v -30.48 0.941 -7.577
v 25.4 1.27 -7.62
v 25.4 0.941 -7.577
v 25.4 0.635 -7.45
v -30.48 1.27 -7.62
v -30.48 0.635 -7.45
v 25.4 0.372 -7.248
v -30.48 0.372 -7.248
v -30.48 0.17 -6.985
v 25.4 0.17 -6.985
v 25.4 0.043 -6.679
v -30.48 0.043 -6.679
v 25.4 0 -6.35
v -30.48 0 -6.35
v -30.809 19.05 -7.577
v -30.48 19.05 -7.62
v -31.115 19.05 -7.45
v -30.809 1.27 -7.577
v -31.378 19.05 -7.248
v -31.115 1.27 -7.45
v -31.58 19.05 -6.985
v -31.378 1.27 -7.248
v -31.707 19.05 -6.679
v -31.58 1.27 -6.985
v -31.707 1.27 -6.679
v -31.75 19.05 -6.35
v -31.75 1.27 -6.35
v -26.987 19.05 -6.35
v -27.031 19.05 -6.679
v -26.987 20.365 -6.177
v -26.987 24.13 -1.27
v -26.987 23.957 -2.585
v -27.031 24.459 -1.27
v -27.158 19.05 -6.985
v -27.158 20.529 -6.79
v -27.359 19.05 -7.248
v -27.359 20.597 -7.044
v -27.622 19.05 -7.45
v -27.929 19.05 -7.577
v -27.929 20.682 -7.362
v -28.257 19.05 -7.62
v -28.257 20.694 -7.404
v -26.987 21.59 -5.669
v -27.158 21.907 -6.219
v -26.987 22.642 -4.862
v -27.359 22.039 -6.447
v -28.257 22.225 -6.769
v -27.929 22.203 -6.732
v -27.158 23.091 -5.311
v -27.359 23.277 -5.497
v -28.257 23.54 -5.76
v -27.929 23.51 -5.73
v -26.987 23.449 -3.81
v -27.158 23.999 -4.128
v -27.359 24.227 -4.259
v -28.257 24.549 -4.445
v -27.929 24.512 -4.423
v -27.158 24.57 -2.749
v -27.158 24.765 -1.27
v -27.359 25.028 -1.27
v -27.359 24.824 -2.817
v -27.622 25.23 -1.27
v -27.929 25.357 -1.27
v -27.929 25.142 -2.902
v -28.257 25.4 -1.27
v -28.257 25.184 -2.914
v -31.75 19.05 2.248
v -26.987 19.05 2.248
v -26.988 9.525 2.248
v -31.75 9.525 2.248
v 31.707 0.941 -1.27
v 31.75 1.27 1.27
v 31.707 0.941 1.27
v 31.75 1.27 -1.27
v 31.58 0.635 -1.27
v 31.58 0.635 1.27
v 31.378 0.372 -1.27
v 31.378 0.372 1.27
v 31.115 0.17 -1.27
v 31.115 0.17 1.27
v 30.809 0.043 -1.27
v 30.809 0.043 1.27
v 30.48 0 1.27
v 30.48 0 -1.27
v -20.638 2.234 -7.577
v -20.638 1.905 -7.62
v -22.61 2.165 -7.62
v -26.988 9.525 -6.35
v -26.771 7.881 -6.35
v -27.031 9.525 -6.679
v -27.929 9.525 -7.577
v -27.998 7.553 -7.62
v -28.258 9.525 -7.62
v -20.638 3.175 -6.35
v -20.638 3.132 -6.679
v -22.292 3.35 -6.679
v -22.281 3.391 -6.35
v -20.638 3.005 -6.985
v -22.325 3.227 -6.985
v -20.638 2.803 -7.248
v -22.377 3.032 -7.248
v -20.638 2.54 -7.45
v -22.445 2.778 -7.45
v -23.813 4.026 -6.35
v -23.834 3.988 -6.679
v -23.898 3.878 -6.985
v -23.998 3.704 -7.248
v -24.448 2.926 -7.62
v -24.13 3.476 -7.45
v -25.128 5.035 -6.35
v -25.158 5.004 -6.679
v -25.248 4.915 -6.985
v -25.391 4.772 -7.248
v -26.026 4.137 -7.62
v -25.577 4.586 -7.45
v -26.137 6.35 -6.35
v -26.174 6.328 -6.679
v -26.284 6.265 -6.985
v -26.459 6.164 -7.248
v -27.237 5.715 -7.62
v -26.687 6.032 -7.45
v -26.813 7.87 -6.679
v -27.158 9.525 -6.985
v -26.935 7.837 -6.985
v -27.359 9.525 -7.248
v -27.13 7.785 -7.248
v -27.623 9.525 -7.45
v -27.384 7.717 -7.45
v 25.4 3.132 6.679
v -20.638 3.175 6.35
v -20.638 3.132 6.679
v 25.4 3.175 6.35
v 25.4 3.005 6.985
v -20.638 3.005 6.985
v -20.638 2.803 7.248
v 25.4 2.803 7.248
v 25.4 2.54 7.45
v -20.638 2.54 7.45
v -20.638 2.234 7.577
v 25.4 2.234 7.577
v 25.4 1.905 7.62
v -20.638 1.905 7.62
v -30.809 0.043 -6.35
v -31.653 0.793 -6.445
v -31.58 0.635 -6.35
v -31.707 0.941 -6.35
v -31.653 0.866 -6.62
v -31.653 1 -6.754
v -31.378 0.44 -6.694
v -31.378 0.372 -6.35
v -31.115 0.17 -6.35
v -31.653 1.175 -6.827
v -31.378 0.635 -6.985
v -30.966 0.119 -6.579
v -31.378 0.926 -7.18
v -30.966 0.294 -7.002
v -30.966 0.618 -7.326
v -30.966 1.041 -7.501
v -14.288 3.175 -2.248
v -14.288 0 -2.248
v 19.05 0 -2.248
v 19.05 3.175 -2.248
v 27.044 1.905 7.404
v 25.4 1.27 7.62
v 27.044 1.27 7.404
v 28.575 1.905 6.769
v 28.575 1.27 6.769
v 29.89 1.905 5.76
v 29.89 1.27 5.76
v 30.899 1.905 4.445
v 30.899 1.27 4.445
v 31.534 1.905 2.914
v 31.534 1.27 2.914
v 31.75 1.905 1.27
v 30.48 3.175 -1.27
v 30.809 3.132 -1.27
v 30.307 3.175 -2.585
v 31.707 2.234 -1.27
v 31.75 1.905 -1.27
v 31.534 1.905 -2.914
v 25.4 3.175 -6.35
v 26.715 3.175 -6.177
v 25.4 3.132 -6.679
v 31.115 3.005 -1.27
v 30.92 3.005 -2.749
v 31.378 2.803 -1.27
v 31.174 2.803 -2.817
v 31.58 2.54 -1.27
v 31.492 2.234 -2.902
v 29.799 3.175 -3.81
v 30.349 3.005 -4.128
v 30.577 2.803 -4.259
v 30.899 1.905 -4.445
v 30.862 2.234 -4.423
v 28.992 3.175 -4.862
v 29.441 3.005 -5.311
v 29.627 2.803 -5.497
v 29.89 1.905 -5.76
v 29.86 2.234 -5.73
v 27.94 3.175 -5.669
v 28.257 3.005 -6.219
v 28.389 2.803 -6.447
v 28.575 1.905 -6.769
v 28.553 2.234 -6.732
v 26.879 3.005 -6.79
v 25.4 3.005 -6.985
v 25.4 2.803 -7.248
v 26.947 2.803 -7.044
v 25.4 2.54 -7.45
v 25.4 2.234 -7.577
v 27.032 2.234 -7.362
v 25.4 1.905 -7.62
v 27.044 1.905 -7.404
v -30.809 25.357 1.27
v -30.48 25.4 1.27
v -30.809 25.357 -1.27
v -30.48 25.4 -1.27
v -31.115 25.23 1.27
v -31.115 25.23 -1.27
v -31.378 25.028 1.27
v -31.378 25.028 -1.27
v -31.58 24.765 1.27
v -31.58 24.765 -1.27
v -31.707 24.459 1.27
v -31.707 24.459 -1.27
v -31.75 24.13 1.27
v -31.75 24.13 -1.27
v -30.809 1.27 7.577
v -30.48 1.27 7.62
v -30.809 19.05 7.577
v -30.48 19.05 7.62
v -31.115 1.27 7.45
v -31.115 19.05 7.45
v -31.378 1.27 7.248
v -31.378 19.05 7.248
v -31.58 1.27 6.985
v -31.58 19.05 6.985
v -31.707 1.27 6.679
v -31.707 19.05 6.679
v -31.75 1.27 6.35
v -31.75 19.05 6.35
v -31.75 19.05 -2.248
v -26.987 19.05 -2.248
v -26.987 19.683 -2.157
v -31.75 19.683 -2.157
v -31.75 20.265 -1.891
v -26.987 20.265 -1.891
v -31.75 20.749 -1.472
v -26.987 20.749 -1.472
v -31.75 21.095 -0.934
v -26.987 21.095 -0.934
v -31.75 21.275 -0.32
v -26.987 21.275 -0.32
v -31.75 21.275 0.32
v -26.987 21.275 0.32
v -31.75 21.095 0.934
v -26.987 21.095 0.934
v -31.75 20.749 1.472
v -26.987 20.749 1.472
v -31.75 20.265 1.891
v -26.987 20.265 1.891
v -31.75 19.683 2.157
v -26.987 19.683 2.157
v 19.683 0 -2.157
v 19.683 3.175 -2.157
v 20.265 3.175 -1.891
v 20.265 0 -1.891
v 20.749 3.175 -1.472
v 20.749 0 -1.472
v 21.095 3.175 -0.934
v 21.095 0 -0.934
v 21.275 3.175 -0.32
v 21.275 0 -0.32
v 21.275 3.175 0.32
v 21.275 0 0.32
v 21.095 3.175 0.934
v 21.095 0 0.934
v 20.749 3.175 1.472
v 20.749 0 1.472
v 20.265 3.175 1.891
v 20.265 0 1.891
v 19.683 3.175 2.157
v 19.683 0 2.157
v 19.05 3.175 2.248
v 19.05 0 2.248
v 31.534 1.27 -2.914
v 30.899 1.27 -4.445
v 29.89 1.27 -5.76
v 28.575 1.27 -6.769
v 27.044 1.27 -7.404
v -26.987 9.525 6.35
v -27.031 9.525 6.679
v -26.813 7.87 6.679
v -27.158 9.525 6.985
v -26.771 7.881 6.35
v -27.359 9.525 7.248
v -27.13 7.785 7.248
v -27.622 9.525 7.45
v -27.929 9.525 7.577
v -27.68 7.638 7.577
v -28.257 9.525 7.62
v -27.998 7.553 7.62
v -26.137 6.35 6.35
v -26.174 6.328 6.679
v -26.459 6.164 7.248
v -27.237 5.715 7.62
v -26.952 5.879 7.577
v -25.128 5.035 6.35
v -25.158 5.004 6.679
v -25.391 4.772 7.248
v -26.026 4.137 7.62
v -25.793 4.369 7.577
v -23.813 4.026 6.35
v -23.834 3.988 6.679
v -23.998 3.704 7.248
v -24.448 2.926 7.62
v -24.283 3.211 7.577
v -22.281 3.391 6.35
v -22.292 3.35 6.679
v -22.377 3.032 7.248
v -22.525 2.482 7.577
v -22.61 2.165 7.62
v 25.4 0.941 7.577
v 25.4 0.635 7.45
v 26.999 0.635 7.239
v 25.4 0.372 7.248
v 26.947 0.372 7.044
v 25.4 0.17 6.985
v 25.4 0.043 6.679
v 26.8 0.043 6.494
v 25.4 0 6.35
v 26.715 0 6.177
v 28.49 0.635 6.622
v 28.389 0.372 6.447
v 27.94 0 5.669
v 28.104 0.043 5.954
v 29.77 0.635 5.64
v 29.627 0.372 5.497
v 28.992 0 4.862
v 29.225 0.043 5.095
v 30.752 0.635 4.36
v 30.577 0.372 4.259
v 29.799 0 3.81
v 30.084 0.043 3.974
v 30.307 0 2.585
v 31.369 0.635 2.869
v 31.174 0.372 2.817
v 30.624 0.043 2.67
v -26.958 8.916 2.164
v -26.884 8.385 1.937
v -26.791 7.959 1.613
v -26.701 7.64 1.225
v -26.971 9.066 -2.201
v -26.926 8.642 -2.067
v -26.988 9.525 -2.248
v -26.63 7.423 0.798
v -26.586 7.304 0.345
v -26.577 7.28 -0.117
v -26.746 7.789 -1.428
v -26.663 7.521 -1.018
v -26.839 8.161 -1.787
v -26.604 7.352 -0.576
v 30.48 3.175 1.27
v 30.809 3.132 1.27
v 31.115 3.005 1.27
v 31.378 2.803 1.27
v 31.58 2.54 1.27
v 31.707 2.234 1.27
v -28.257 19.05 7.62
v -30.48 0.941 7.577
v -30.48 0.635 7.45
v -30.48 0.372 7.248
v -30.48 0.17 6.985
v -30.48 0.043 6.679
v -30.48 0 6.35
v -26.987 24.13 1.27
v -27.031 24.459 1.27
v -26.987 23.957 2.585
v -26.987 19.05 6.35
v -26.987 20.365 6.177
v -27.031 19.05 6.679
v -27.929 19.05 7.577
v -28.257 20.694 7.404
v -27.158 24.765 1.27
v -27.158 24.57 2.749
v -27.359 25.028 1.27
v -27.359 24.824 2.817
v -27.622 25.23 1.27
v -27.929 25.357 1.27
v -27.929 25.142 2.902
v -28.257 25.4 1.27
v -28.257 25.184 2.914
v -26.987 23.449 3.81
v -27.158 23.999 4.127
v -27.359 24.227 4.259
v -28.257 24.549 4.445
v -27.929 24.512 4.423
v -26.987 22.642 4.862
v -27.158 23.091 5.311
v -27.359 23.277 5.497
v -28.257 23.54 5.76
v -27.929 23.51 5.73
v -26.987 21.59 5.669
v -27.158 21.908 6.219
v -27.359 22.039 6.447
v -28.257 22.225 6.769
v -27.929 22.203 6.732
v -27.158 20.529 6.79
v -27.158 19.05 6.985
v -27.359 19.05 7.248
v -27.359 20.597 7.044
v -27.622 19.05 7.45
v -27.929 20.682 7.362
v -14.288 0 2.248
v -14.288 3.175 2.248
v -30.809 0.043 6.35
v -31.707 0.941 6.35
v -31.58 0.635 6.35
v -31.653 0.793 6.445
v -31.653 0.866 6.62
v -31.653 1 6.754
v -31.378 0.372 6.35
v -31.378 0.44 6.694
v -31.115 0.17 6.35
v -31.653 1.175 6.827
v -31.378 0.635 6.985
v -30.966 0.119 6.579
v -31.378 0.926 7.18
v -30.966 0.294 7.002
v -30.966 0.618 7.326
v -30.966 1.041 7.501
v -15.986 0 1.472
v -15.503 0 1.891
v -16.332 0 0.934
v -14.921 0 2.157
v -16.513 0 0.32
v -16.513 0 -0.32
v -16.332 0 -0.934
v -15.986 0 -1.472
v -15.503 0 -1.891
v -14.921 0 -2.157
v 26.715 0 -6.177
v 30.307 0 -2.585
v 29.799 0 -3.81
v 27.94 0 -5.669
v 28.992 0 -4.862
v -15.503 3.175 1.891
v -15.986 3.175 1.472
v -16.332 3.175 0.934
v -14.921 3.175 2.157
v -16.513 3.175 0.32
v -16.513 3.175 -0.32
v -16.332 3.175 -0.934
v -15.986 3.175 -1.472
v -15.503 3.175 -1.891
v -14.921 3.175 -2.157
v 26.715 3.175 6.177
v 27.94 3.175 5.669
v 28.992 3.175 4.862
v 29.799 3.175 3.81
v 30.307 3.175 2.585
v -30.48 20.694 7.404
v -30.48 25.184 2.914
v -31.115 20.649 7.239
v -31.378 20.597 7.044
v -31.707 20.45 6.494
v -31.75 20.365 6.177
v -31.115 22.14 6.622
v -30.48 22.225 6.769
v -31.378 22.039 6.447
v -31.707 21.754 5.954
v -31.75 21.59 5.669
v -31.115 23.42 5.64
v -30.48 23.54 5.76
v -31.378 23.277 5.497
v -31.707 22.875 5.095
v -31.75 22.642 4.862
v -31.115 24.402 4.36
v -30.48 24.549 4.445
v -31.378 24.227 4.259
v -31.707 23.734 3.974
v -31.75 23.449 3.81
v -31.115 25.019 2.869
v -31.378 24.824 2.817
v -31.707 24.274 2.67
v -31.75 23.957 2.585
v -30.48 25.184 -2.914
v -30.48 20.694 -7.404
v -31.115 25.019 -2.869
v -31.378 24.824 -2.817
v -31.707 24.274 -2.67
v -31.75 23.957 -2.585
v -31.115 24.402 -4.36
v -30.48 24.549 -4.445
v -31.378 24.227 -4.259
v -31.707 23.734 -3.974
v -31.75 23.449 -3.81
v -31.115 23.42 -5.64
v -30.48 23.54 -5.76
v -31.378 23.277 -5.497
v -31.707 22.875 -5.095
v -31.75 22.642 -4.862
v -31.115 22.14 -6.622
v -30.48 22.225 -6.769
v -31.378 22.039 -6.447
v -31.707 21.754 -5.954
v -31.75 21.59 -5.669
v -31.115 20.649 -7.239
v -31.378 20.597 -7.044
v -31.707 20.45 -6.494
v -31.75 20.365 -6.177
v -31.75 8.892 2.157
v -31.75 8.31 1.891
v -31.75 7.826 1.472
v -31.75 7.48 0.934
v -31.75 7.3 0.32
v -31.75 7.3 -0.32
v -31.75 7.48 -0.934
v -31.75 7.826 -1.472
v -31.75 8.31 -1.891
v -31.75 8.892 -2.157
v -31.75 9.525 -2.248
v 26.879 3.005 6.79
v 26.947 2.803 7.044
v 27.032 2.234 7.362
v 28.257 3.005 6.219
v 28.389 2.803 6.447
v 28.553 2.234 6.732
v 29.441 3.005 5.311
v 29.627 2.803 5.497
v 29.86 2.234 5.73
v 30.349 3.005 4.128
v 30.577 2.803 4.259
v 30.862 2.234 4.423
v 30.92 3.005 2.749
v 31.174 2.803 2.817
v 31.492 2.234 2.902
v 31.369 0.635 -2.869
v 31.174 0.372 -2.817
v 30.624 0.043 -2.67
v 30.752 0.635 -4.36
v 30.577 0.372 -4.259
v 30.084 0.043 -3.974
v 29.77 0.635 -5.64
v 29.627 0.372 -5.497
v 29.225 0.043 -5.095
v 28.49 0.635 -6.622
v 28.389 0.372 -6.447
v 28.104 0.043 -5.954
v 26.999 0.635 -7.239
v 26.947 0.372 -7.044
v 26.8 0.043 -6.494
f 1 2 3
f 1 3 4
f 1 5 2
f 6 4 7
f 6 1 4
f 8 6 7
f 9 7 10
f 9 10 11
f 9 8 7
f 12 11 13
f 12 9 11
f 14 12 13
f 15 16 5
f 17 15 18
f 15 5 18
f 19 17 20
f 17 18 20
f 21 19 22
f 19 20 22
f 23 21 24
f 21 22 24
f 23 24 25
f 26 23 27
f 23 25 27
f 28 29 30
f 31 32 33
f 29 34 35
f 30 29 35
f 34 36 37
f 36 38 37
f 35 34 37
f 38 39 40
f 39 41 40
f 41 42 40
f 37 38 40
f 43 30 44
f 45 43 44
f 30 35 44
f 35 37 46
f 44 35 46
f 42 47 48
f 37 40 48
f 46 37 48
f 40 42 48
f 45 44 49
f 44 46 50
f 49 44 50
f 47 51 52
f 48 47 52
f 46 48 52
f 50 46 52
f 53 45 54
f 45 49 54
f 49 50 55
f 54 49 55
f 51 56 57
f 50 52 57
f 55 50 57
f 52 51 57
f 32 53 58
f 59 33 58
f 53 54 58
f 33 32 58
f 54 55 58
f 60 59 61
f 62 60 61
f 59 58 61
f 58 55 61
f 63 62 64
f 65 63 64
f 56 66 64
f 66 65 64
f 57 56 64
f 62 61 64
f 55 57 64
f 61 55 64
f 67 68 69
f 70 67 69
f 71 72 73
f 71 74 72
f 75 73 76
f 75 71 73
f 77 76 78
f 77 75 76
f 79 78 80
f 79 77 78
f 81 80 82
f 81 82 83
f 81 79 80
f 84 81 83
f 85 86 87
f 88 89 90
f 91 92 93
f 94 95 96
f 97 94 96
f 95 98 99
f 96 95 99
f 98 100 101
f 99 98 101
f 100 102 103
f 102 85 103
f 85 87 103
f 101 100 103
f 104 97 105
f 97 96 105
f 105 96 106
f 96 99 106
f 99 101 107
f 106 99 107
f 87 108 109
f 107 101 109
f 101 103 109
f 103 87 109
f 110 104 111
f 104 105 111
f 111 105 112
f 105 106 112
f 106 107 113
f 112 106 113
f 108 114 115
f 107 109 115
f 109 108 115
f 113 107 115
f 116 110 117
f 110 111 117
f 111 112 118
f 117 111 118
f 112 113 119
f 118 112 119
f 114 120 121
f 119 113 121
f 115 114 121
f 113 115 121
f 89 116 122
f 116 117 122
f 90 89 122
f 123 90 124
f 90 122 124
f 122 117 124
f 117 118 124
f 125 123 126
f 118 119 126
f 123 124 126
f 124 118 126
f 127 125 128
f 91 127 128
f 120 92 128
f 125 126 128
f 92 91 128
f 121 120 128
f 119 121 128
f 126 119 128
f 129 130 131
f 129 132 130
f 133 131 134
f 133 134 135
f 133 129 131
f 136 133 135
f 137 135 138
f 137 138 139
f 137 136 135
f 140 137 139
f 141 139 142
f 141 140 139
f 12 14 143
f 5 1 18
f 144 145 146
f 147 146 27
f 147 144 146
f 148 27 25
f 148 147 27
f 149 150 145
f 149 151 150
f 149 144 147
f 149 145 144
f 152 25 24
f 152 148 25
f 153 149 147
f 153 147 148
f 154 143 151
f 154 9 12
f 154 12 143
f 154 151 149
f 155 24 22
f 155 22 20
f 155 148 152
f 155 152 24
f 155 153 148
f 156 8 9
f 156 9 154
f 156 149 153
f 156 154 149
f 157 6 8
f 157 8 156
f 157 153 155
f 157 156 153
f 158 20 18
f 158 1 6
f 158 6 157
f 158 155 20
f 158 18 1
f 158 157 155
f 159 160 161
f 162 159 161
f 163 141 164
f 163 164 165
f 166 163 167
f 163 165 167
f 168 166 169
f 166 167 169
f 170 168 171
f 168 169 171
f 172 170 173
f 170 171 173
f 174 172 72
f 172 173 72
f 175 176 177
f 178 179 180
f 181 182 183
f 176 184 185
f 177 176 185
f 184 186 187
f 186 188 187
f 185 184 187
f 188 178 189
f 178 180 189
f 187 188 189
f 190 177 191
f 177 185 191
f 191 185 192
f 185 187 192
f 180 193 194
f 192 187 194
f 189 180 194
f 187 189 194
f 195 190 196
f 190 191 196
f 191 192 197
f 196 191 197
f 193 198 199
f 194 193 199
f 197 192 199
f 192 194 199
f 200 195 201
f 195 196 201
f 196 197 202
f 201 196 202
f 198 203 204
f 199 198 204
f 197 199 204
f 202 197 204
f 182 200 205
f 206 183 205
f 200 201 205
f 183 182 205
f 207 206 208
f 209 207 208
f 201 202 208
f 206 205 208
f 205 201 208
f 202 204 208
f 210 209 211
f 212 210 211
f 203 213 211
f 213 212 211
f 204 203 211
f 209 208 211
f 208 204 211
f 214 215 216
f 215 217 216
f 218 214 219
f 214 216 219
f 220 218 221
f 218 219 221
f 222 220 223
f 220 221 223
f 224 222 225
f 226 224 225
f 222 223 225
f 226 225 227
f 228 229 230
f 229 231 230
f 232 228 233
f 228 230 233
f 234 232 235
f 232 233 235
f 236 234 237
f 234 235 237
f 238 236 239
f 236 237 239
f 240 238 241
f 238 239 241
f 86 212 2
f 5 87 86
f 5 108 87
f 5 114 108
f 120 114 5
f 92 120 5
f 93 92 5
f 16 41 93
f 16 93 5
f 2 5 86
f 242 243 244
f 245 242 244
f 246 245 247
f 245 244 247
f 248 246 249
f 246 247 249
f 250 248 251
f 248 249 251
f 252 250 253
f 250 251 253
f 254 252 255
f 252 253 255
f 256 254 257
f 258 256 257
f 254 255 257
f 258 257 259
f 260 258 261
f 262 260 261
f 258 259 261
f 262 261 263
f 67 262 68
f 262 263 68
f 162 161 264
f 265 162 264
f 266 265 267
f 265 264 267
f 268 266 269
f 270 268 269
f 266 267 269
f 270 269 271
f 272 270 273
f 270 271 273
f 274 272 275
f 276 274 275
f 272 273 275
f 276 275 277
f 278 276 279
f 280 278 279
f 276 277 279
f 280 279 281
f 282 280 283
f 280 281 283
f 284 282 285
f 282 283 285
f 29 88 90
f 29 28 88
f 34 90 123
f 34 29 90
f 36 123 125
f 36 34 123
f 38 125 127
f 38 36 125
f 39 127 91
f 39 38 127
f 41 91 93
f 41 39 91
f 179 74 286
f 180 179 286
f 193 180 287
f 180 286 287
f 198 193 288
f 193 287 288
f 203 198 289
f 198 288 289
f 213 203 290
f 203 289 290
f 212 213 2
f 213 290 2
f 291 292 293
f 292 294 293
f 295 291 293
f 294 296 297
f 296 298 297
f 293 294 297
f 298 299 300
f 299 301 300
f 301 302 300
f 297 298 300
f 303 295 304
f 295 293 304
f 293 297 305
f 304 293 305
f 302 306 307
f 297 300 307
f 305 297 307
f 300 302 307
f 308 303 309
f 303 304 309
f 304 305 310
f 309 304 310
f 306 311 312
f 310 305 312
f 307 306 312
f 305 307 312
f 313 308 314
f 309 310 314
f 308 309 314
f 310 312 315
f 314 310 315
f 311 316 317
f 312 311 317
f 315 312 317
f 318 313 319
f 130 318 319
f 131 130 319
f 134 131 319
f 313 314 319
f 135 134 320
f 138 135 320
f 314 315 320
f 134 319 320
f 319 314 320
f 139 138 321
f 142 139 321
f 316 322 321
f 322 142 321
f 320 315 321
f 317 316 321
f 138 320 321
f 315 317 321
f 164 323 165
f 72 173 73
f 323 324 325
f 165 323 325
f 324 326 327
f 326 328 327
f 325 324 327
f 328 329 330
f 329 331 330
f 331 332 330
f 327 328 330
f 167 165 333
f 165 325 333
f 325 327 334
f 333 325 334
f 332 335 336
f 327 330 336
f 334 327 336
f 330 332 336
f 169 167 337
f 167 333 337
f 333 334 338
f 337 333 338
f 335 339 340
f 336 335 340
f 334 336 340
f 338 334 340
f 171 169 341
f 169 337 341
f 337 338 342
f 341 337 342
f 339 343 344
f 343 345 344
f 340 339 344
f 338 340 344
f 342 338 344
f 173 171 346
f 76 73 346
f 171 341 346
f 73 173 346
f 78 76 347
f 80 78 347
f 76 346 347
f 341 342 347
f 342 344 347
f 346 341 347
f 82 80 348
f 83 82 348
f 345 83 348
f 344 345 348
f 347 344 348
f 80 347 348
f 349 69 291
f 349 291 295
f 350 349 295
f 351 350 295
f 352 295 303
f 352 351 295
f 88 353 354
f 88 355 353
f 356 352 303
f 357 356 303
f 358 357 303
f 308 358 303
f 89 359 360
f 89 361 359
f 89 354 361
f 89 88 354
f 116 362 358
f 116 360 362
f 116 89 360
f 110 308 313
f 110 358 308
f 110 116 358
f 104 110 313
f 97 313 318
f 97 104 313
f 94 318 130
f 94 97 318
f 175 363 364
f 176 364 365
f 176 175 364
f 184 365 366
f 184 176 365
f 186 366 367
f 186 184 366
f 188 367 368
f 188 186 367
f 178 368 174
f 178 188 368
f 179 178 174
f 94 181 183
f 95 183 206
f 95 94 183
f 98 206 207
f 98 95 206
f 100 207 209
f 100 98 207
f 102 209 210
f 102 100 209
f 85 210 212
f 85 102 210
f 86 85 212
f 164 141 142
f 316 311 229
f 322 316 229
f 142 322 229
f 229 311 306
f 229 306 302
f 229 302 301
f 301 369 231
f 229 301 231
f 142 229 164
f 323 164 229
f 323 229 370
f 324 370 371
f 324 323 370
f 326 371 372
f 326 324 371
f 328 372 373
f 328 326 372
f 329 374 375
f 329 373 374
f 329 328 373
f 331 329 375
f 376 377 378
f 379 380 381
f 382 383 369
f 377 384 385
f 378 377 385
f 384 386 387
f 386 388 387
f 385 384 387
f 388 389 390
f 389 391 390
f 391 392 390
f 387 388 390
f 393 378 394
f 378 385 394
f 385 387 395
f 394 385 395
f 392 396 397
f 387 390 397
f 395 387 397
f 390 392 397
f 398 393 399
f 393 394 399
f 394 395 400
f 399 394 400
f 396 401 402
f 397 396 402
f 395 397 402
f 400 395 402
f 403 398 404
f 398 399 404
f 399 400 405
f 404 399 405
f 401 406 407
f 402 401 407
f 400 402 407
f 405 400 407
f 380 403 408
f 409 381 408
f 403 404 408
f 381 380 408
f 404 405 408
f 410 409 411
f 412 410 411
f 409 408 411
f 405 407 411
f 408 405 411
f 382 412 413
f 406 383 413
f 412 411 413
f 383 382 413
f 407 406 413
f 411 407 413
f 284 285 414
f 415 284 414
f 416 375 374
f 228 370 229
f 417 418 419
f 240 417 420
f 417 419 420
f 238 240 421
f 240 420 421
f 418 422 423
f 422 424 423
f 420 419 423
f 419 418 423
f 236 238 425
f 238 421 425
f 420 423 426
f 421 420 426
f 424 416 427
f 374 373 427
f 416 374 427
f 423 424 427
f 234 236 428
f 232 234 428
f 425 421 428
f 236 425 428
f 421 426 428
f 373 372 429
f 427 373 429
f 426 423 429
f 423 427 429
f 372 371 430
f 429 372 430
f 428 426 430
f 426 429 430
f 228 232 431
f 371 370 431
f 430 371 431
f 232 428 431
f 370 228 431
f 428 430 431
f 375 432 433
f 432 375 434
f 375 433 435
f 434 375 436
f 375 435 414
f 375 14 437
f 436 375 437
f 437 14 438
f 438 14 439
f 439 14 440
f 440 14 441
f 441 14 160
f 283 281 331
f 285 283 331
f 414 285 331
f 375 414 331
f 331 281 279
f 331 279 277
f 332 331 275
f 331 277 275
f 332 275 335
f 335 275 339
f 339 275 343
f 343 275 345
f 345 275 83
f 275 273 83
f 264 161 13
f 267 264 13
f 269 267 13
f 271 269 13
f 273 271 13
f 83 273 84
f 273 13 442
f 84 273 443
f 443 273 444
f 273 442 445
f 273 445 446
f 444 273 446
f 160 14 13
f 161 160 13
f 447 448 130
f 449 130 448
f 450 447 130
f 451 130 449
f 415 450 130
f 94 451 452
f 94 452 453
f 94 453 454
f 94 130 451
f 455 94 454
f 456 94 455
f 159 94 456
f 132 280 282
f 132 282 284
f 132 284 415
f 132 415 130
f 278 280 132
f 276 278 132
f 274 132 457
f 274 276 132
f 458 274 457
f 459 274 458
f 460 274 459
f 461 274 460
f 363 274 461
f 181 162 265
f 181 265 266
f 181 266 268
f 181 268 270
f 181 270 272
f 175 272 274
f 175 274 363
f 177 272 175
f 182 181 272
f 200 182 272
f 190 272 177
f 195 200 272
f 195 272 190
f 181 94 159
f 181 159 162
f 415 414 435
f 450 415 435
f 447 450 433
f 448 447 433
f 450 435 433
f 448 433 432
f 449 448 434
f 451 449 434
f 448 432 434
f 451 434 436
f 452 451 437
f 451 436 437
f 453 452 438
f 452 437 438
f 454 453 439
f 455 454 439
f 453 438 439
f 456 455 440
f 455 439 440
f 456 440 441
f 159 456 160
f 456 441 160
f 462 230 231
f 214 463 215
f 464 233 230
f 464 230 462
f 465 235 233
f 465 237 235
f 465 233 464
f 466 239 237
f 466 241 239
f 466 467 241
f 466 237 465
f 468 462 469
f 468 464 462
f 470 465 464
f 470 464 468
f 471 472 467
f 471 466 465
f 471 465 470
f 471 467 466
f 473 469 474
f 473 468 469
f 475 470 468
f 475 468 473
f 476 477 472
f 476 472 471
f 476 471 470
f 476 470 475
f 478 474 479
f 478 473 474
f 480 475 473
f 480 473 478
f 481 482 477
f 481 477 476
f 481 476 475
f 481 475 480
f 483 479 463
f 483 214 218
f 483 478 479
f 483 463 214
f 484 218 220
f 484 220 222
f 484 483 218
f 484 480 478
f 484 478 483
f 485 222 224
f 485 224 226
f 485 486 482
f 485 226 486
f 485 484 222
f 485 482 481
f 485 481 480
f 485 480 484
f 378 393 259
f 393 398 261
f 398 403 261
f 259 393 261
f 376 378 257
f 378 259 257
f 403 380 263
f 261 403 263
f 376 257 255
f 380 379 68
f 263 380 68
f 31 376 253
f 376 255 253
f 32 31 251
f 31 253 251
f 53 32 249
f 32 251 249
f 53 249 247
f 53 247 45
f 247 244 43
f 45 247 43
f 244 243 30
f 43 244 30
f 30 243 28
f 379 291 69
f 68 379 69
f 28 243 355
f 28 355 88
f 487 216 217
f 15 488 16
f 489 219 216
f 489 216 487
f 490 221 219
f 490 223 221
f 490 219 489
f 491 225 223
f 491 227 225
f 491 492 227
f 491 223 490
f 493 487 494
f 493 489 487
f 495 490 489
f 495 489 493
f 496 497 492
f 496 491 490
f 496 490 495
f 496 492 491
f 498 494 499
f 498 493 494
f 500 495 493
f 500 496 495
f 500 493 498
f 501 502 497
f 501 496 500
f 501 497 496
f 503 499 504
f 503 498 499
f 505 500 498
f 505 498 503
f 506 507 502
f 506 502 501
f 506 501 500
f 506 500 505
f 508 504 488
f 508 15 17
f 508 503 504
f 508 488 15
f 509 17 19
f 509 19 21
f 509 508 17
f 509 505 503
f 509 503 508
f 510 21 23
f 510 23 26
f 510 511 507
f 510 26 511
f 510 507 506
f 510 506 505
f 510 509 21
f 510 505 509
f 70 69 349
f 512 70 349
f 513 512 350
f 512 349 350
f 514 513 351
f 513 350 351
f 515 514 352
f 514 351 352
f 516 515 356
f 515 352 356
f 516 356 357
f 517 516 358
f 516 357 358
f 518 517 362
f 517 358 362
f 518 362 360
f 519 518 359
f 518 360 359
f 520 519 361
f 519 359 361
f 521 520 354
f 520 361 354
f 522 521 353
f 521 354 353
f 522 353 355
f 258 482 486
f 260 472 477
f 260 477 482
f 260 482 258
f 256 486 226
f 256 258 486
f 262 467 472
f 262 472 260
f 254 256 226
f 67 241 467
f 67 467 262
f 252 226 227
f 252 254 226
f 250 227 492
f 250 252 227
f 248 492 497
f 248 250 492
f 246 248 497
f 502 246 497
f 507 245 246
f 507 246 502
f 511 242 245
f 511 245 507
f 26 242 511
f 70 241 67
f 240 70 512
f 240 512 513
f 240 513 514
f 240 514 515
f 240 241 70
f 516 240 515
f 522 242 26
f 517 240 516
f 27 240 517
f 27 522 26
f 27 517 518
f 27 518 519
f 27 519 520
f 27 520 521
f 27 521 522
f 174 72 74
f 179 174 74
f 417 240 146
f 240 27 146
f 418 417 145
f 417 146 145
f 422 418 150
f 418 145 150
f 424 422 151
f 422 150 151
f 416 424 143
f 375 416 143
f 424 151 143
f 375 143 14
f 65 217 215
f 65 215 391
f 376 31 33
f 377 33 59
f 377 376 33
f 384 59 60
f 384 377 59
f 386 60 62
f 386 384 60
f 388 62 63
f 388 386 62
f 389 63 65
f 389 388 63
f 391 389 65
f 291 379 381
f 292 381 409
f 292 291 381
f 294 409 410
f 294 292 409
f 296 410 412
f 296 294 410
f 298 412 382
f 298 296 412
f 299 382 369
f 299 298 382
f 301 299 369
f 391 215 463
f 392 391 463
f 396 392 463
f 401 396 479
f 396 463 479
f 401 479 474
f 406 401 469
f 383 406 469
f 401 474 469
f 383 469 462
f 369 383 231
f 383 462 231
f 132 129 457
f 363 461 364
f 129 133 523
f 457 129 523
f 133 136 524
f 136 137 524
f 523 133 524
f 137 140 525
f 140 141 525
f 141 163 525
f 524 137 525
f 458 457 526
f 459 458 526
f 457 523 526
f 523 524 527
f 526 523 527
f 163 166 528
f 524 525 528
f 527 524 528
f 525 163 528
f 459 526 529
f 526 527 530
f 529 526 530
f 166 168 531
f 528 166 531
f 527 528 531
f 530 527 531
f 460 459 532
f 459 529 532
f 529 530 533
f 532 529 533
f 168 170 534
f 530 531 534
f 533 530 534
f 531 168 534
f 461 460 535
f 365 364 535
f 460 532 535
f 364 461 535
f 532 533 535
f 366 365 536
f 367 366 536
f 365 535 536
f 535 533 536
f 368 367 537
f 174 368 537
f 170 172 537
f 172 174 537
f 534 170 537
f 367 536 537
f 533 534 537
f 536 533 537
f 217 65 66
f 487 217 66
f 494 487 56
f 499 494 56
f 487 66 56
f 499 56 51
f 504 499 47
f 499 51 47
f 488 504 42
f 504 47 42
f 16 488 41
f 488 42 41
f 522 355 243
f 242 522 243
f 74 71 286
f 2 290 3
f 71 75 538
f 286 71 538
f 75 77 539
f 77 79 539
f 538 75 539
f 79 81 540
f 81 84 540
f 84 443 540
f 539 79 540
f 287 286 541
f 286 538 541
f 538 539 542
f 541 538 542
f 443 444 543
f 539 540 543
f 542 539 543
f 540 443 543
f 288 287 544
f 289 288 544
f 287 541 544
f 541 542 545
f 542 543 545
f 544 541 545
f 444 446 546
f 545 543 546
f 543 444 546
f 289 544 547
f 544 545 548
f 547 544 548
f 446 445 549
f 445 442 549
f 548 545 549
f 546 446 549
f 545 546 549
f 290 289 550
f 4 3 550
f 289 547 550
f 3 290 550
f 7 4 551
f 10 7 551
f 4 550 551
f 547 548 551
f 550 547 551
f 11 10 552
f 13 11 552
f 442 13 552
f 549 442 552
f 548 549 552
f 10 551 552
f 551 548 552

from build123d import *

# Parameters (mm, degrees)
ESQUISSE1_W                  = 58.7375
ESQUISSE1_H                  = 15.24
BOSS_EXTRU_1_DEPTH           = 3.175
ESQUISSE1_3_W                = 4.7625
ESQUISSE1_3_H                = 15.24
BOSS_EXTRU_2_DEPTH           = 25.4
ENL_V_MAT_EXTRU_1_DEPTH      = 69.814783295
ENL_V_MAT_EXTRU_1_DEPTH_BACK = 69.814783295
CONG_1_R                     = 6.35
CONG_2_R                     = 1.27


with BuildPart() as part:
    # Esquisse1 → Boss.-Extru.1 (new body)
    with BuildSketch(Plane(origin=(0, 0, 0), x_dir=(1, 0, 0), z_dir=(0, 1, 0))):
        with Locations((2.38125, 0)):
            Rectangle(ESQUISSE1_W, ESQUISSE1_H)
        with BuildLine():
            ThreePointArc((19.05, 2.2479), (21.2979, 0), (19.05, -2.2479))
            Line((19.05, -2.2479), (-14.2875, -2.2479))
            ThreePointArc((-14.2875, -2.2479), (-16.5354, 0), (-14.2875, 2.2479))
            Line((-14.2875, 2.2479), (19.05, 2.2479))
        make_face(mode=Mode.SUBTRACT)
    extrude(amount=BOSS_EXTRU_1_DEPTH)

    # Esquisse1<3> → Boss.-Extru.2 (add)
    with BuildSketch(Plane(origin=(0, 0, 0), x_dir=(1, 0, 0), z_dir=(0, 1, 0))):
        with Locations((-29.36875, 0)):
            Rectangle(ESQUISSE1_3_W, ESQUISSE1_3_H)
    extrude(amount=BOSS_EXTRU_2_DEPTH)

    # Esquisse3 → Enlèv. mat.-Extru.1 (cut, two sides: drawn at the far end of the back side and taken through both)
    with BuildSketch(Plane.ZY.offset(31.75).offset(-ENL_V_MAT_EXTRU_1_DEPTH_BACK)):
        with BuildLine():
            Line((2.2479, 19.05), (2.2479, 9.525))
            ThreePointArc((2.2479, 9.525), (0, 7.2771), (-2.2479, 9.525))
            Line((-2.2479, 9.525), (-2.2479, 19.05))
            ThreePointArc((-2.2479, 19.05), (0, 21.2979), (2.2479, 19.05))
        make_face()
    extrude(amount=ENL_V_MAT_EXTRU_1_DEPTH + ENL_V_MAT_EXTRU_1_DEPTH_BACK, mode=Mode.SUBTRACT)

    # Congé1
    # the kernel refuses this fillet: 6.35 mm, written as the material it adds along each edge
    with BuildSketch(Plane(origin=(-26.9875, 3.175, -7.62), x_dir=(1, 0, 0), z_dir=(0, 0, 1))) as cong_1_piece_1_section:
        with BuildLine():
            CenterArc((CONG_1_R, CONG_1_R), CONG_1_R, 180, 90)
            Line((0, CONG_1_R), (0, 0))
            Line((0, 0), (CONG_1_R, 0))
        make_face()
    cong_1_piece_1 = extrude(amount=15.24, mode=Mode.PRIVATE)
    cong_1_piece_1 = cong_1_piece_1 - Plane(origin=(-25.549891024, 9.525, 0), x_dir=(0, 0, 1), z_dir=(1, 0, 0)) * Cylinder(2.2479, 56, mode=Mode.PRIVATE)
    add(cong_1_piece_1)
    # the kernel refuses this fillet: 6.35 mm, written as the material it takes off along each edge
    with BuildSketch(Plane(origin=(31.75, -15.875, 7.62), x_dir=(0, 0, -1), z_dir=(0, 1, 0)), Plane(origin=(31.75, -15.875, -7.62), x_dir=(-1, 0, 0), z_dir=(0, 1, 0))) as cong_1_2_piece_1:
        with BuildLine():
            CenterArc((CONG_1_R, CONG_1_R), CONG_1_R, 180, 90)
            Line((0, CONG_1_R), (0, 0))
            Line((0, 0), (CONG_1_R, 0))
        make_face()
    extrude(amount=34.925, mode=Mode.SUBTRACT)
    with BuildSketch(Plane(origin=(-11.1125, 25.4, -7.62), x_dir=(0, -1, 0), z_dir=(-1, 0, 0))) as cong_1_2_piece_2:
        with BuildLine():
            CenterArc((CONG_1_R, CONG_1_R), CONG_1_R, 180, 90)
            Line((0, CONG_1_R), (0, 0))
            Line((0, 0), (CONG_1_R, 0))
        make_face()
    extrude(amount=36.5125, mode=Mode.SUBTRACT)
    with BuildSketch(Plane(origin=(-47.625, 25.4, 7.62), x_dir=(0, 0, -1), z_dir=(1, 0, 0))) as cong_1_2_piece_3:
        with BuildLine():
            CenterArc((CONG_1_R, -CONG_1_R), CONG_1_R, 90, 90)
            Line((0, -CONG_1_R), (0, 0))
            Line((0, 0), (CONG_1_R, 0))
        make_face()
    extrude(amount=36.5125, mode=Mode.SUBTRACT)

    # Congé2
    cong_2_edges = [part.edges().sort_by_distance(p)[0] for p in [
        (-3.175, 0, -7.62),
        (-3.175, 0, 7.62),
        (-31.75, 0, 0),
        (2.38125, 3.175, 7.62),
        (31.75, 3.175, 0),
        (2.38125, 3.175, -7.62),
        (29.890128061, 3.175, -5.760128061),
        (29.890128061, 3.175, 5.760128061),
        (-26.9875, 14.2875, -7.62),
        (-26.9875, 25.4, 0),
        (-26.9875, 14.2875, 7.62),
        (-26.9875, 23.540128061, 5.760128061),
        (-26.9875, 23.540128061, -5.760128061),
        (31.75, 0, 0),
        (29.890128061, 0, -5.760128061),
        (29.890128061, 0, 5.760128061),
        (-31.75, 9.525, 7.62),
        (-31.75, 9.525, -7.62),
        (-31.75, 25.4, 0),
        (-31.75, 23.540128061, 5.760128061),
        (-31.75, 23.540128061, -5.760128061),
        (-25.127628061, 5.034871939, 7.62),
        (-25.127628061, 5.034871939, -7.62),
    ]]
    fillet(cong_2_edges, radius=CONG_2_R)


solid = part.part
